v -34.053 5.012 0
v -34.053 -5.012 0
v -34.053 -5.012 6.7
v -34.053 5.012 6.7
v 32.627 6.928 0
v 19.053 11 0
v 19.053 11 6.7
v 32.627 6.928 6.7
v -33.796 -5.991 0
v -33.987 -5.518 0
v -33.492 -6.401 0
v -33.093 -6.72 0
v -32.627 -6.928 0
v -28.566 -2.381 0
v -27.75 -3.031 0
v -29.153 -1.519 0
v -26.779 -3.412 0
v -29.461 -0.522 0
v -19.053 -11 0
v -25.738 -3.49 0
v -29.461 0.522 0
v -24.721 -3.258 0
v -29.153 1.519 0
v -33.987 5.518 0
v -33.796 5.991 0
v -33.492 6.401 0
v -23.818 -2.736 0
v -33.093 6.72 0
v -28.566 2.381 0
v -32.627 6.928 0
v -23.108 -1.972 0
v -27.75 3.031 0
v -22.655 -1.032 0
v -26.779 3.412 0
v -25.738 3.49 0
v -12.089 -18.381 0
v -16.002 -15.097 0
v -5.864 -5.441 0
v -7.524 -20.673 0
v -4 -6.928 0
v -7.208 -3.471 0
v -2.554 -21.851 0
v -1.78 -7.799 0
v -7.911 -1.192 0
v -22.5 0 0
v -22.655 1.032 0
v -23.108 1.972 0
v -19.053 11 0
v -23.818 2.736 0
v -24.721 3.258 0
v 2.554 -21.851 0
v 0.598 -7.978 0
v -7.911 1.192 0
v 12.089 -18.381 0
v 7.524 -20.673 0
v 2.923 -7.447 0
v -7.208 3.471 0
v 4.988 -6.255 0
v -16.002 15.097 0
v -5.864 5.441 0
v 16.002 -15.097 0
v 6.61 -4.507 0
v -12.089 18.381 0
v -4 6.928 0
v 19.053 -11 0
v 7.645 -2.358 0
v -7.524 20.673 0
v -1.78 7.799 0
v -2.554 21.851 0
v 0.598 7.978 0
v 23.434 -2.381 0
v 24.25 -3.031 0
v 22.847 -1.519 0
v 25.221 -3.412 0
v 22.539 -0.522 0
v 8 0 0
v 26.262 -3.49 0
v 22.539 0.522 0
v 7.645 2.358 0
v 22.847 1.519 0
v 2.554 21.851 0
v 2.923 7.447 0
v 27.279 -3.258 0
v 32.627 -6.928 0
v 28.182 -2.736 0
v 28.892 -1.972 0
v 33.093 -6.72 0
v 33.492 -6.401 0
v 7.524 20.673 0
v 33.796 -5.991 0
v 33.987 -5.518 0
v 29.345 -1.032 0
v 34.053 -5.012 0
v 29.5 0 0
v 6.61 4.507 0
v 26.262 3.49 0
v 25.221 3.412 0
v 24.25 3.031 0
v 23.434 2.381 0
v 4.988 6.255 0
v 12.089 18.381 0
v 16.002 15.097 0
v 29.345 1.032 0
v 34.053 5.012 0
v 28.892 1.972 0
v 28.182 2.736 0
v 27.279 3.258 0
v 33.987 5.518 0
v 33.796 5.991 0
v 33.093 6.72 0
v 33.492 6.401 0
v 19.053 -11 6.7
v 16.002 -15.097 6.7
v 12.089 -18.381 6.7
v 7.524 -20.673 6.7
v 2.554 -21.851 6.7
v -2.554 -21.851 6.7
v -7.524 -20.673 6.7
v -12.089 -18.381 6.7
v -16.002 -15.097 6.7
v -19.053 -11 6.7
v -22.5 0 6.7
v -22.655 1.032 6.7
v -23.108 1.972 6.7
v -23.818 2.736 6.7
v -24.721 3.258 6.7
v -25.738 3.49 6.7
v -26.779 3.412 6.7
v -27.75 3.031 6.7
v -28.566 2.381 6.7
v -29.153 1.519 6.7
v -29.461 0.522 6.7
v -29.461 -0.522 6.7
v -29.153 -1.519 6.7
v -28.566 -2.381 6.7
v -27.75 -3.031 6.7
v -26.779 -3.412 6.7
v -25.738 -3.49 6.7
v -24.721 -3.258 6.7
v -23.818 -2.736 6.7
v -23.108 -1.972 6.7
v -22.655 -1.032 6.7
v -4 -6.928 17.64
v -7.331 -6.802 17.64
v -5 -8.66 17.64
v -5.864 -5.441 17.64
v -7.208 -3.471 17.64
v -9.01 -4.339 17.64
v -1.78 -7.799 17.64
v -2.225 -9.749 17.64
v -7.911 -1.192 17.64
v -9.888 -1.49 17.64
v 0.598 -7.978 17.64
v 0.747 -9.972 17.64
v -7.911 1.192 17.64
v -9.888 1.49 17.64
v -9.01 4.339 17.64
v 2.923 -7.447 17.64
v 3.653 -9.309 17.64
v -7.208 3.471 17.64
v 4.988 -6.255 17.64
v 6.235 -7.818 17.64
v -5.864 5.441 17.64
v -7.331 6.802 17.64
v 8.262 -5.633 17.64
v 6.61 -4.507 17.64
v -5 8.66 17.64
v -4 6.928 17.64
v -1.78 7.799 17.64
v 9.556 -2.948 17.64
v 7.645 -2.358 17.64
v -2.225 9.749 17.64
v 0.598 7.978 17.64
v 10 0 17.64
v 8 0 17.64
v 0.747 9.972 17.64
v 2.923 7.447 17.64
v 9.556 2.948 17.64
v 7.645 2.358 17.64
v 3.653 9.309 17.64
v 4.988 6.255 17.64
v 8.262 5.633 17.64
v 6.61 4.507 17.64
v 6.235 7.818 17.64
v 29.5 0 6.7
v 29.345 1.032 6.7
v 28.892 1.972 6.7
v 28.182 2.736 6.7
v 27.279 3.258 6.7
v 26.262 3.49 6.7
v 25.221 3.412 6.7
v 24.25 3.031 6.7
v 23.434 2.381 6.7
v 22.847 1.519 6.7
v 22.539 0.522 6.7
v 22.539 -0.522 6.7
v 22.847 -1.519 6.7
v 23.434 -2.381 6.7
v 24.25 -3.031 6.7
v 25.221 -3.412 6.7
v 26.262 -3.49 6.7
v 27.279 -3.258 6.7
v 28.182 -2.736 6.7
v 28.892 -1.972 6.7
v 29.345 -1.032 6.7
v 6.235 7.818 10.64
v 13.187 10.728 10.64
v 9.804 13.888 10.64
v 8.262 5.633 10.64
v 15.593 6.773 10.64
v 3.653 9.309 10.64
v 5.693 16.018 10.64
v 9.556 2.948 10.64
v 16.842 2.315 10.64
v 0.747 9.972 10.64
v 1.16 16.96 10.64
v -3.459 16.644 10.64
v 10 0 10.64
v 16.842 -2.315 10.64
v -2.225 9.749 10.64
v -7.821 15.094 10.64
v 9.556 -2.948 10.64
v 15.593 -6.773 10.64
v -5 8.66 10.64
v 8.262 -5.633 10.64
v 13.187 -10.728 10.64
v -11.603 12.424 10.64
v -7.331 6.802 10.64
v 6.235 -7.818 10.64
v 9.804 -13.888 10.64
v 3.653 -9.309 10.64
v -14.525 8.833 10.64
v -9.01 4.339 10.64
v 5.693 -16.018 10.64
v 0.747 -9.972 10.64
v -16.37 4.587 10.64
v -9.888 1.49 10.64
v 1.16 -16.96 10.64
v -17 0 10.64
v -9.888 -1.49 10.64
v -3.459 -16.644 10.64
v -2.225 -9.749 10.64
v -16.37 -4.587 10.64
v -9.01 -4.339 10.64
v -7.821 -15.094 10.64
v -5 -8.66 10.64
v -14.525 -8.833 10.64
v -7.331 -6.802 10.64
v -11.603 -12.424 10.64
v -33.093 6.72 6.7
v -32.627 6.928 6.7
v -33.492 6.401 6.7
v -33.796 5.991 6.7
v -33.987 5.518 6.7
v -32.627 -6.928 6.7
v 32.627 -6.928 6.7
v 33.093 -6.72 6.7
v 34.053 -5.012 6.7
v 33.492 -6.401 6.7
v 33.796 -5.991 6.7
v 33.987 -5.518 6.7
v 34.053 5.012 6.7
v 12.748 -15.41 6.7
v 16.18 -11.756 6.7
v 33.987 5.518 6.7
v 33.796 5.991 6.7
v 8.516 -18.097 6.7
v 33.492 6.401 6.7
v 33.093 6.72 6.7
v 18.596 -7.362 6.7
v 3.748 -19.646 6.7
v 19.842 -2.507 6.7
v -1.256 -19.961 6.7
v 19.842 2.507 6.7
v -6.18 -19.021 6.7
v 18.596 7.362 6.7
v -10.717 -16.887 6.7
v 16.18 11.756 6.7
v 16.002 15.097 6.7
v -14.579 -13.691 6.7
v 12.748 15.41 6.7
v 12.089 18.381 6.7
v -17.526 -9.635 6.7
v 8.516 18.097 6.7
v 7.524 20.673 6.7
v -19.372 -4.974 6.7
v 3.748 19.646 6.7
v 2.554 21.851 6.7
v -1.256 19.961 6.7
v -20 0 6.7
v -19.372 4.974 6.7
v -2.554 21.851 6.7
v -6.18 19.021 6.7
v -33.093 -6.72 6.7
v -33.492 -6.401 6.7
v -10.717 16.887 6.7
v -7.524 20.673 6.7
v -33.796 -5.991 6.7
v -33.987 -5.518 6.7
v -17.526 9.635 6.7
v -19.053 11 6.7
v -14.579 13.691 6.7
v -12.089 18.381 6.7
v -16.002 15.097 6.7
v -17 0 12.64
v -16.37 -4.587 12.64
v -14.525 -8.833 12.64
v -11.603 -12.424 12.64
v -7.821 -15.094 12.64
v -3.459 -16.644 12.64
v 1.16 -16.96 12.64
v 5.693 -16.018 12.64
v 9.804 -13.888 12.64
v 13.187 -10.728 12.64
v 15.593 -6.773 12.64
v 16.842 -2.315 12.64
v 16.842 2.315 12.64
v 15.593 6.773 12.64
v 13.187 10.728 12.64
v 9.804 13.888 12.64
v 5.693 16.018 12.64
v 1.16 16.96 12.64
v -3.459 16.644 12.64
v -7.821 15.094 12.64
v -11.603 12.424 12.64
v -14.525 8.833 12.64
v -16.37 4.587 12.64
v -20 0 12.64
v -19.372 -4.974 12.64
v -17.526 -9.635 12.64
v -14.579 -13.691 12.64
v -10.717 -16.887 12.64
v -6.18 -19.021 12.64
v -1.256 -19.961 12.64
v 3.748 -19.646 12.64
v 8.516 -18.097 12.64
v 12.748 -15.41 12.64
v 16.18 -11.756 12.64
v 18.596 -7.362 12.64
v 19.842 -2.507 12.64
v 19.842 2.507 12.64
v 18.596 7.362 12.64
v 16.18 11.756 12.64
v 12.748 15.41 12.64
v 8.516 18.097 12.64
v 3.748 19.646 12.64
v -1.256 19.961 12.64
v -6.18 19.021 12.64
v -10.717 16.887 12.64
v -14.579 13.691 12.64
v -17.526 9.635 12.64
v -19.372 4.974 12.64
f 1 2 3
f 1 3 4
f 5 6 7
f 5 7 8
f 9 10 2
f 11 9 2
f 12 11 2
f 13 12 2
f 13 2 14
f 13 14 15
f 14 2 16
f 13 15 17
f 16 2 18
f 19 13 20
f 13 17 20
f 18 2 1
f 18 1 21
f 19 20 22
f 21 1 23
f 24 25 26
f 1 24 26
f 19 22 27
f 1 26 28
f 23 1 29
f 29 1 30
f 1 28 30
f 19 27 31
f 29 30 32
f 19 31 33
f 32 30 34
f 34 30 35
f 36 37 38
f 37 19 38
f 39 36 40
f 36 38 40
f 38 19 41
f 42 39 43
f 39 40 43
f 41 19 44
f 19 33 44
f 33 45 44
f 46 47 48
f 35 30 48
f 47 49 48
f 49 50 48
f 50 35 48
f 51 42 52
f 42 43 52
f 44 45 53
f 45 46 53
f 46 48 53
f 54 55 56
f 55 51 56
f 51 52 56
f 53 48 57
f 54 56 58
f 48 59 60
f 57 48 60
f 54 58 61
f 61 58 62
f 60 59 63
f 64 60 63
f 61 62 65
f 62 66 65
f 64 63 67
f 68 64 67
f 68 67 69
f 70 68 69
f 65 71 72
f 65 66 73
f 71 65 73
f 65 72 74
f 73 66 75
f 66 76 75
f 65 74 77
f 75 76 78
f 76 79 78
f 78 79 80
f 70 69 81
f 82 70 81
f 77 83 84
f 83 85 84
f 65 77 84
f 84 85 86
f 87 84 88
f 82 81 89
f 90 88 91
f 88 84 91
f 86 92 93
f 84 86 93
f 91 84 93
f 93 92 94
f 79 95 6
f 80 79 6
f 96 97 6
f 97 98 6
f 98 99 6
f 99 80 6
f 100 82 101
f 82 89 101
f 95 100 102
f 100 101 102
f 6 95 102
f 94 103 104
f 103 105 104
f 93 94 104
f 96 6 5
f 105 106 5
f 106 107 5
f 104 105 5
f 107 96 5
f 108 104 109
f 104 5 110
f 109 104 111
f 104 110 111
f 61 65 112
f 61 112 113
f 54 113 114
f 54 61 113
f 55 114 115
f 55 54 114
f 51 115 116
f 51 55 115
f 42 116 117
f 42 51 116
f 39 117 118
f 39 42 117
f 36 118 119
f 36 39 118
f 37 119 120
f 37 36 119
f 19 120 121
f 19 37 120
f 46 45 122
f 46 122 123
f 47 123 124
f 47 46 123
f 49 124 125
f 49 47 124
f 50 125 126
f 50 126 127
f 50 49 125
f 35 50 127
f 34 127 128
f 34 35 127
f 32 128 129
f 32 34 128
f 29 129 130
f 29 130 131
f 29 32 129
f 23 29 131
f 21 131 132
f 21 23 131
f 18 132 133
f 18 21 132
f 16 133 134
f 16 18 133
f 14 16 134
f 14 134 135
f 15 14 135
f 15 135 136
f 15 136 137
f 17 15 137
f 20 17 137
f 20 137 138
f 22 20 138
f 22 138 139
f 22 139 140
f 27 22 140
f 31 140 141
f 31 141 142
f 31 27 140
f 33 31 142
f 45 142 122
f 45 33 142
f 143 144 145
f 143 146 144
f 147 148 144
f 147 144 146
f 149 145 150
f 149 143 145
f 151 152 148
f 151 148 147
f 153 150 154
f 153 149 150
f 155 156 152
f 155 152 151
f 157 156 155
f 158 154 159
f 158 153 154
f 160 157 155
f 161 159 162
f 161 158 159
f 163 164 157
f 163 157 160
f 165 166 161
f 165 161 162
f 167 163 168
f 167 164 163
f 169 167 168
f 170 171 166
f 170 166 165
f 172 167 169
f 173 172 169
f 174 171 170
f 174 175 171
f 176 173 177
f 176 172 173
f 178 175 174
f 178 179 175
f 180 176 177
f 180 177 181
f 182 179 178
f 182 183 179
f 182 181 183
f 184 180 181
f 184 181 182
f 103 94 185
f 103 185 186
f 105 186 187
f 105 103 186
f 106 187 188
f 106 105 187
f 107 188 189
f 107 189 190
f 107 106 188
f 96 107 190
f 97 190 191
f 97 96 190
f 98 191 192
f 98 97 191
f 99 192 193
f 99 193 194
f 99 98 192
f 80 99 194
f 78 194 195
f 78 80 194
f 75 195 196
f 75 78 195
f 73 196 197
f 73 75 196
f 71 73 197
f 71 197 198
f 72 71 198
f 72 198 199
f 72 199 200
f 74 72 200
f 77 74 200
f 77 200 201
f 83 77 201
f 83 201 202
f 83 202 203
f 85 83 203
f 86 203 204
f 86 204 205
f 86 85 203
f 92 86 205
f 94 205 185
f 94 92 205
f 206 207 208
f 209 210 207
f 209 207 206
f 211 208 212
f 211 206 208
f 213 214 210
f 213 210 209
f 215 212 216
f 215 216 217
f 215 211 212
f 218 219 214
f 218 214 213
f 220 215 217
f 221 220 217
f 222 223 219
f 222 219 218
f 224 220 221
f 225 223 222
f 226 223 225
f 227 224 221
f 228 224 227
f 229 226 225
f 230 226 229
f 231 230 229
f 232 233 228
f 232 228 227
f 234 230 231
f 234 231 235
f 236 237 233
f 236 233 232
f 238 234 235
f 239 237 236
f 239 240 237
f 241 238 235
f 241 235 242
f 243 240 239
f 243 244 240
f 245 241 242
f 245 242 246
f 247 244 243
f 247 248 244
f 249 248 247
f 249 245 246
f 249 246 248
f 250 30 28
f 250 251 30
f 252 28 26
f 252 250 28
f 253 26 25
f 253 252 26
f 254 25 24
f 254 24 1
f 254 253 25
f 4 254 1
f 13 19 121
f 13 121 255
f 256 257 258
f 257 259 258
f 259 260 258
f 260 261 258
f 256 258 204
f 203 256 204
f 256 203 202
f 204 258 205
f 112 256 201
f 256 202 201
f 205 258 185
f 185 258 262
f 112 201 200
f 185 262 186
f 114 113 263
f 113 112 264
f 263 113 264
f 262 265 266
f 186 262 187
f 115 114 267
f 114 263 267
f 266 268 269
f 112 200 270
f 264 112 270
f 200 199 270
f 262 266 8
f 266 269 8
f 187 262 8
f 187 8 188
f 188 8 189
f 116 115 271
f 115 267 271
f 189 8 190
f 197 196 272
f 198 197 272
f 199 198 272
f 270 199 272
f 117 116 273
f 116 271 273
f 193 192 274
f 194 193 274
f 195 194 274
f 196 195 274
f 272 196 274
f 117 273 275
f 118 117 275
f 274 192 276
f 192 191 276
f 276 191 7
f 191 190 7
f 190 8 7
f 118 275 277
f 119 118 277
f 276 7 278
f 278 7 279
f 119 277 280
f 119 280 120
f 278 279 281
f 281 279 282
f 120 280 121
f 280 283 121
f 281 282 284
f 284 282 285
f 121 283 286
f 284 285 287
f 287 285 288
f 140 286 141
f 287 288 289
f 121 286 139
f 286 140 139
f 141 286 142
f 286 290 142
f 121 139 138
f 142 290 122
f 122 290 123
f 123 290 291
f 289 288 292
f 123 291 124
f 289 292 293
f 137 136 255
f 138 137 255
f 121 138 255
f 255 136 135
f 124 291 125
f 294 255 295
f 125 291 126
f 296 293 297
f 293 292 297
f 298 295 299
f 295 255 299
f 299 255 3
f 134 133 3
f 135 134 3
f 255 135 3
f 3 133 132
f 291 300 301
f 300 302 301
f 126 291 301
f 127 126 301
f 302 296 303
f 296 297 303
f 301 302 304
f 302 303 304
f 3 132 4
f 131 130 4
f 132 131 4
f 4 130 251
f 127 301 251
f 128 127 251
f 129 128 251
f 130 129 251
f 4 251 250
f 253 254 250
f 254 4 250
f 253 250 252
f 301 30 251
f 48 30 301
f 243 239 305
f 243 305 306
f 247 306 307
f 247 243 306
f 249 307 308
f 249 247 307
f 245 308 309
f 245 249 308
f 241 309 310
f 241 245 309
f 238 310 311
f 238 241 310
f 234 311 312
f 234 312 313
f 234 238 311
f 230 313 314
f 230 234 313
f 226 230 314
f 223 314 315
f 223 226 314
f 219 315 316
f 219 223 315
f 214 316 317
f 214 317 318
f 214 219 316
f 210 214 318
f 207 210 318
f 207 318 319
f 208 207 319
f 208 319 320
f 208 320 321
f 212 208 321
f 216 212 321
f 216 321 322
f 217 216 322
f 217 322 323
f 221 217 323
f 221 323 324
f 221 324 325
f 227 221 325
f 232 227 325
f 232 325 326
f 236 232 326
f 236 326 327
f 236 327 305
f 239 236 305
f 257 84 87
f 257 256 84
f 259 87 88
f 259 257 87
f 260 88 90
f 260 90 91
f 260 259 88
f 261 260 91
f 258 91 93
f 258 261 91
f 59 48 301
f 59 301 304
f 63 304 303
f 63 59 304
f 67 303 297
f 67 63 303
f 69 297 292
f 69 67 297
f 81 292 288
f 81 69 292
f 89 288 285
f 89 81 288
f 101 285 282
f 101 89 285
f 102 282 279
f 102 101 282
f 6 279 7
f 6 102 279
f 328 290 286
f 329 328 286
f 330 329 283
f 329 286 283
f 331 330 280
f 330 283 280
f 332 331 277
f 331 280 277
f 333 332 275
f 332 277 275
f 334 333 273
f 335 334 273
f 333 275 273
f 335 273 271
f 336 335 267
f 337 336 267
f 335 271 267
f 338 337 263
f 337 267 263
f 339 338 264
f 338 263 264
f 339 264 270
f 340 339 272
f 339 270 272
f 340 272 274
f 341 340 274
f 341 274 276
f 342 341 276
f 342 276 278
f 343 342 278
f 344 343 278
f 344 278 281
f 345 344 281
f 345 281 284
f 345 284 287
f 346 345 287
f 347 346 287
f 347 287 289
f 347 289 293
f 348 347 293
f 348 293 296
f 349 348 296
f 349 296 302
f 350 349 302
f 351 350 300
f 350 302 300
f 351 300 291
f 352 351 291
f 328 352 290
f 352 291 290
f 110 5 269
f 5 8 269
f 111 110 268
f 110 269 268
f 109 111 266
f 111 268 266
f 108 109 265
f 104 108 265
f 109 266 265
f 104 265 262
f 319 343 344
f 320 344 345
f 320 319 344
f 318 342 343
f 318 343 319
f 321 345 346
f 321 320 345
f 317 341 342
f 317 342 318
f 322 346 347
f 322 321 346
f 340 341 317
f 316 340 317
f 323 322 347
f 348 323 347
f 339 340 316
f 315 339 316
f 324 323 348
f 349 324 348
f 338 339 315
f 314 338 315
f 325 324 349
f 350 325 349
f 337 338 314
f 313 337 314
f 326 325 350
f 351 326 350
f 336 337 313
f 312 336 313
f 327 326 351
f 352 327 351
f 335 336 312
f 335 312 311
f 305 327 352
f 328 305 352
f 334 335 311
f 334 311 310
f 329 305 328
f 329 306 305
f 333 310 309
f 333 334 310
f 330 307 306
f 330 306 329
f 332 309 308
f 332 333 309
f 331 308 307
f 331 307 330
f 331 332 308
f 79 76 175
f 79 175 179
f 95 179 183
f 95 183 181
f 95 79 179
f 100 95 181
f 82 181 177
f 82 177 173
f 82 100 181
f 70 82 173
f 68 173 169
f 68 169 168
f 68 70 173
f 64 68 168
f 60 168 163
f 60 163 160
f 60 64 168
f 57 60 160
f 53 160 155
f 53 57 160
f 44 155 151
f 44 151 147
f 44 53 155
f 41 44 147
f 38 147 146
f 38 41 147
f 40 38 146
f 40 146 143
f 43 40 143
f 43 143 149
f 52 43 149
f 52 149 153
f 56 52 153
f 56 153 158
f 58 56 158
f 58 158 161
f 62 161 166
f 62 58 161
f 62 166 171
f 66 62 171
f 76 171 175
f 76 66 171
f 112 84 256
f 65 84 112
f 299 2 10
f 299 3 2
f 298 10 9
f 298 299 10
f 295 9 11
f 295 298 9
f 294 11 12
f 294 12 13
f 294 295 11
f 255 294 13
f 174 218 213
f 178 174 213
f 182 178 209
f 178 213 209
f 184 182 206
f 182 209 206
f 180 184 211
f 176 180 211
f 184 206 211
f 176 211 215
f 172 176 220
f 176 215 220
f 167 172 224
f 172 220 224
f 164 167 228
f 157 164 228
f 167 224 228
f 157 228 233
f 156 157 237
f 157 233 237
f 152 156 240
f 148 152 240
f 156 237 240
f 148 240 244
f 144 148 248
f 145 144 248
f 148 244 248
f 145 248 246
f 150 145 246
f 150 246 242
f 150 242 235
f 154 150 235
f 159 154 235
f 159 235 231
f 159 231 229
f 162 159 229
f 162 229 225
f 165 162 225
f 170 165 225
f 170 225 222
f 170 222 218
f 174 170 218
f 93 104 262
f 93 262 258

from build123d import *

# Parameters (mm, degrees)
SKETCH_1_R      = 10
SKETCH_1_R_2    = 3.5
EXTRUDE_1_DEPTH = 6.7
SKETCH_1_4_R    = 20
SKETCH_1_4_R_2  = 17
EXTRUDE_2_DEPTH = 12.64
SKETCH_1_5_R    = 17
SKETCH_1_5_R_2  = 10
EXTRUDE_3_DEPTH = 10.64
SKETCH_1_6_R    = 10
SKETCH_1_6_R_2  = 8
EXTRUDE_4_DEPTH = 17.64
FILLET_1_R      = 2


with BuildPart() as part:
    # 스케치1 → 보스-돌출1 (new body)
    with BuildSketch(Plane.XY):
        with BuildLine():
            Line((19.052558883, 11), (34.052558883, 6.5))
            Line((34.052558883, 6.5), (34.052558883, -6.5))
            Line((34.052558883, -6.5), (19.052558883, -11))
            ThreePointArc((19.052558883, -11), (0, -22), (-19.052558883, -11))
            Line((-19.052558883, -11), (-34.052558883, -6.5))
            Line((-34.052558883, -6.5), (-34.052558883, 6.5))
            Line((-34.052558883, 6.5), (-19.052558883, 11))
            ThreePointArc((-19.052558883, 11), (0, 22), (19.052558883, 11))
        make_face()
        Circle(SKETCH_1_R, mode=Mode.SUBTRACT)
        with Locations((26, 0)):
            Circle(SKETCH_1_R_2, mode=Mode.SUBTRACT)
        with Locations((-26, 0)):
            Circle(SKETCH_1_R_2, mode=Mode.SUBTRACT)
    extrude(amount=EXTRUDE_1_DEPTH)

    # 스케치1<4> → 보스-돌출2 (add)
    with BuildSketch(Plane.XY):
        with Locations(Location((0, 0, 0), (0, 0, 180))):
            Circle(SKETCH_1_4_R)
        with Locations(Location((0, 0, 0), (0, 0, 180))):
            Circle(SKETCH_1_4_R_2, mode=Mode.SUBTRACT)
    extrude(amount=EXTRUDE_2_DEPTH)

    # 스케치1<5> → 보스-돌출3 (add)
    with BuildSketch(Plane.XY):
        with Locations(Location((0, 0, 0), (0, 0, 180))):
            Circle(SKETCH_1_5_R)
        Circle(SKETCH_1_5_R_2, mode=Mode.SUBTRACT)
    extrude(amount=EXTRUDE_3_DEPTH)

    # 스케치1<6> → 보스-돌출4 (add)
    with BuildSketch(Plane.XY):
        Circle(SKETCH_1_6_R)
        Circle(SKETCH_1_6_R_2, mode=Mode.SUBTRACT)
    extrude(amount=EXTRUDE_4_DEPTH)

    # 필렛1
    fillet_1_edges = [part.edges().sort_by_distance(p)[0] for p in [
        (-34.052558883, -6.5, 3.35),
        (-34.052558883, 6.5, 3.35),
        (34.052558883, 6.5, 3.35),
        (34.052558883, -6.5, 3.35),
    ]]
    fillet(fillet_1_edges, radius=FILLET_1_R)


solid = part.part
